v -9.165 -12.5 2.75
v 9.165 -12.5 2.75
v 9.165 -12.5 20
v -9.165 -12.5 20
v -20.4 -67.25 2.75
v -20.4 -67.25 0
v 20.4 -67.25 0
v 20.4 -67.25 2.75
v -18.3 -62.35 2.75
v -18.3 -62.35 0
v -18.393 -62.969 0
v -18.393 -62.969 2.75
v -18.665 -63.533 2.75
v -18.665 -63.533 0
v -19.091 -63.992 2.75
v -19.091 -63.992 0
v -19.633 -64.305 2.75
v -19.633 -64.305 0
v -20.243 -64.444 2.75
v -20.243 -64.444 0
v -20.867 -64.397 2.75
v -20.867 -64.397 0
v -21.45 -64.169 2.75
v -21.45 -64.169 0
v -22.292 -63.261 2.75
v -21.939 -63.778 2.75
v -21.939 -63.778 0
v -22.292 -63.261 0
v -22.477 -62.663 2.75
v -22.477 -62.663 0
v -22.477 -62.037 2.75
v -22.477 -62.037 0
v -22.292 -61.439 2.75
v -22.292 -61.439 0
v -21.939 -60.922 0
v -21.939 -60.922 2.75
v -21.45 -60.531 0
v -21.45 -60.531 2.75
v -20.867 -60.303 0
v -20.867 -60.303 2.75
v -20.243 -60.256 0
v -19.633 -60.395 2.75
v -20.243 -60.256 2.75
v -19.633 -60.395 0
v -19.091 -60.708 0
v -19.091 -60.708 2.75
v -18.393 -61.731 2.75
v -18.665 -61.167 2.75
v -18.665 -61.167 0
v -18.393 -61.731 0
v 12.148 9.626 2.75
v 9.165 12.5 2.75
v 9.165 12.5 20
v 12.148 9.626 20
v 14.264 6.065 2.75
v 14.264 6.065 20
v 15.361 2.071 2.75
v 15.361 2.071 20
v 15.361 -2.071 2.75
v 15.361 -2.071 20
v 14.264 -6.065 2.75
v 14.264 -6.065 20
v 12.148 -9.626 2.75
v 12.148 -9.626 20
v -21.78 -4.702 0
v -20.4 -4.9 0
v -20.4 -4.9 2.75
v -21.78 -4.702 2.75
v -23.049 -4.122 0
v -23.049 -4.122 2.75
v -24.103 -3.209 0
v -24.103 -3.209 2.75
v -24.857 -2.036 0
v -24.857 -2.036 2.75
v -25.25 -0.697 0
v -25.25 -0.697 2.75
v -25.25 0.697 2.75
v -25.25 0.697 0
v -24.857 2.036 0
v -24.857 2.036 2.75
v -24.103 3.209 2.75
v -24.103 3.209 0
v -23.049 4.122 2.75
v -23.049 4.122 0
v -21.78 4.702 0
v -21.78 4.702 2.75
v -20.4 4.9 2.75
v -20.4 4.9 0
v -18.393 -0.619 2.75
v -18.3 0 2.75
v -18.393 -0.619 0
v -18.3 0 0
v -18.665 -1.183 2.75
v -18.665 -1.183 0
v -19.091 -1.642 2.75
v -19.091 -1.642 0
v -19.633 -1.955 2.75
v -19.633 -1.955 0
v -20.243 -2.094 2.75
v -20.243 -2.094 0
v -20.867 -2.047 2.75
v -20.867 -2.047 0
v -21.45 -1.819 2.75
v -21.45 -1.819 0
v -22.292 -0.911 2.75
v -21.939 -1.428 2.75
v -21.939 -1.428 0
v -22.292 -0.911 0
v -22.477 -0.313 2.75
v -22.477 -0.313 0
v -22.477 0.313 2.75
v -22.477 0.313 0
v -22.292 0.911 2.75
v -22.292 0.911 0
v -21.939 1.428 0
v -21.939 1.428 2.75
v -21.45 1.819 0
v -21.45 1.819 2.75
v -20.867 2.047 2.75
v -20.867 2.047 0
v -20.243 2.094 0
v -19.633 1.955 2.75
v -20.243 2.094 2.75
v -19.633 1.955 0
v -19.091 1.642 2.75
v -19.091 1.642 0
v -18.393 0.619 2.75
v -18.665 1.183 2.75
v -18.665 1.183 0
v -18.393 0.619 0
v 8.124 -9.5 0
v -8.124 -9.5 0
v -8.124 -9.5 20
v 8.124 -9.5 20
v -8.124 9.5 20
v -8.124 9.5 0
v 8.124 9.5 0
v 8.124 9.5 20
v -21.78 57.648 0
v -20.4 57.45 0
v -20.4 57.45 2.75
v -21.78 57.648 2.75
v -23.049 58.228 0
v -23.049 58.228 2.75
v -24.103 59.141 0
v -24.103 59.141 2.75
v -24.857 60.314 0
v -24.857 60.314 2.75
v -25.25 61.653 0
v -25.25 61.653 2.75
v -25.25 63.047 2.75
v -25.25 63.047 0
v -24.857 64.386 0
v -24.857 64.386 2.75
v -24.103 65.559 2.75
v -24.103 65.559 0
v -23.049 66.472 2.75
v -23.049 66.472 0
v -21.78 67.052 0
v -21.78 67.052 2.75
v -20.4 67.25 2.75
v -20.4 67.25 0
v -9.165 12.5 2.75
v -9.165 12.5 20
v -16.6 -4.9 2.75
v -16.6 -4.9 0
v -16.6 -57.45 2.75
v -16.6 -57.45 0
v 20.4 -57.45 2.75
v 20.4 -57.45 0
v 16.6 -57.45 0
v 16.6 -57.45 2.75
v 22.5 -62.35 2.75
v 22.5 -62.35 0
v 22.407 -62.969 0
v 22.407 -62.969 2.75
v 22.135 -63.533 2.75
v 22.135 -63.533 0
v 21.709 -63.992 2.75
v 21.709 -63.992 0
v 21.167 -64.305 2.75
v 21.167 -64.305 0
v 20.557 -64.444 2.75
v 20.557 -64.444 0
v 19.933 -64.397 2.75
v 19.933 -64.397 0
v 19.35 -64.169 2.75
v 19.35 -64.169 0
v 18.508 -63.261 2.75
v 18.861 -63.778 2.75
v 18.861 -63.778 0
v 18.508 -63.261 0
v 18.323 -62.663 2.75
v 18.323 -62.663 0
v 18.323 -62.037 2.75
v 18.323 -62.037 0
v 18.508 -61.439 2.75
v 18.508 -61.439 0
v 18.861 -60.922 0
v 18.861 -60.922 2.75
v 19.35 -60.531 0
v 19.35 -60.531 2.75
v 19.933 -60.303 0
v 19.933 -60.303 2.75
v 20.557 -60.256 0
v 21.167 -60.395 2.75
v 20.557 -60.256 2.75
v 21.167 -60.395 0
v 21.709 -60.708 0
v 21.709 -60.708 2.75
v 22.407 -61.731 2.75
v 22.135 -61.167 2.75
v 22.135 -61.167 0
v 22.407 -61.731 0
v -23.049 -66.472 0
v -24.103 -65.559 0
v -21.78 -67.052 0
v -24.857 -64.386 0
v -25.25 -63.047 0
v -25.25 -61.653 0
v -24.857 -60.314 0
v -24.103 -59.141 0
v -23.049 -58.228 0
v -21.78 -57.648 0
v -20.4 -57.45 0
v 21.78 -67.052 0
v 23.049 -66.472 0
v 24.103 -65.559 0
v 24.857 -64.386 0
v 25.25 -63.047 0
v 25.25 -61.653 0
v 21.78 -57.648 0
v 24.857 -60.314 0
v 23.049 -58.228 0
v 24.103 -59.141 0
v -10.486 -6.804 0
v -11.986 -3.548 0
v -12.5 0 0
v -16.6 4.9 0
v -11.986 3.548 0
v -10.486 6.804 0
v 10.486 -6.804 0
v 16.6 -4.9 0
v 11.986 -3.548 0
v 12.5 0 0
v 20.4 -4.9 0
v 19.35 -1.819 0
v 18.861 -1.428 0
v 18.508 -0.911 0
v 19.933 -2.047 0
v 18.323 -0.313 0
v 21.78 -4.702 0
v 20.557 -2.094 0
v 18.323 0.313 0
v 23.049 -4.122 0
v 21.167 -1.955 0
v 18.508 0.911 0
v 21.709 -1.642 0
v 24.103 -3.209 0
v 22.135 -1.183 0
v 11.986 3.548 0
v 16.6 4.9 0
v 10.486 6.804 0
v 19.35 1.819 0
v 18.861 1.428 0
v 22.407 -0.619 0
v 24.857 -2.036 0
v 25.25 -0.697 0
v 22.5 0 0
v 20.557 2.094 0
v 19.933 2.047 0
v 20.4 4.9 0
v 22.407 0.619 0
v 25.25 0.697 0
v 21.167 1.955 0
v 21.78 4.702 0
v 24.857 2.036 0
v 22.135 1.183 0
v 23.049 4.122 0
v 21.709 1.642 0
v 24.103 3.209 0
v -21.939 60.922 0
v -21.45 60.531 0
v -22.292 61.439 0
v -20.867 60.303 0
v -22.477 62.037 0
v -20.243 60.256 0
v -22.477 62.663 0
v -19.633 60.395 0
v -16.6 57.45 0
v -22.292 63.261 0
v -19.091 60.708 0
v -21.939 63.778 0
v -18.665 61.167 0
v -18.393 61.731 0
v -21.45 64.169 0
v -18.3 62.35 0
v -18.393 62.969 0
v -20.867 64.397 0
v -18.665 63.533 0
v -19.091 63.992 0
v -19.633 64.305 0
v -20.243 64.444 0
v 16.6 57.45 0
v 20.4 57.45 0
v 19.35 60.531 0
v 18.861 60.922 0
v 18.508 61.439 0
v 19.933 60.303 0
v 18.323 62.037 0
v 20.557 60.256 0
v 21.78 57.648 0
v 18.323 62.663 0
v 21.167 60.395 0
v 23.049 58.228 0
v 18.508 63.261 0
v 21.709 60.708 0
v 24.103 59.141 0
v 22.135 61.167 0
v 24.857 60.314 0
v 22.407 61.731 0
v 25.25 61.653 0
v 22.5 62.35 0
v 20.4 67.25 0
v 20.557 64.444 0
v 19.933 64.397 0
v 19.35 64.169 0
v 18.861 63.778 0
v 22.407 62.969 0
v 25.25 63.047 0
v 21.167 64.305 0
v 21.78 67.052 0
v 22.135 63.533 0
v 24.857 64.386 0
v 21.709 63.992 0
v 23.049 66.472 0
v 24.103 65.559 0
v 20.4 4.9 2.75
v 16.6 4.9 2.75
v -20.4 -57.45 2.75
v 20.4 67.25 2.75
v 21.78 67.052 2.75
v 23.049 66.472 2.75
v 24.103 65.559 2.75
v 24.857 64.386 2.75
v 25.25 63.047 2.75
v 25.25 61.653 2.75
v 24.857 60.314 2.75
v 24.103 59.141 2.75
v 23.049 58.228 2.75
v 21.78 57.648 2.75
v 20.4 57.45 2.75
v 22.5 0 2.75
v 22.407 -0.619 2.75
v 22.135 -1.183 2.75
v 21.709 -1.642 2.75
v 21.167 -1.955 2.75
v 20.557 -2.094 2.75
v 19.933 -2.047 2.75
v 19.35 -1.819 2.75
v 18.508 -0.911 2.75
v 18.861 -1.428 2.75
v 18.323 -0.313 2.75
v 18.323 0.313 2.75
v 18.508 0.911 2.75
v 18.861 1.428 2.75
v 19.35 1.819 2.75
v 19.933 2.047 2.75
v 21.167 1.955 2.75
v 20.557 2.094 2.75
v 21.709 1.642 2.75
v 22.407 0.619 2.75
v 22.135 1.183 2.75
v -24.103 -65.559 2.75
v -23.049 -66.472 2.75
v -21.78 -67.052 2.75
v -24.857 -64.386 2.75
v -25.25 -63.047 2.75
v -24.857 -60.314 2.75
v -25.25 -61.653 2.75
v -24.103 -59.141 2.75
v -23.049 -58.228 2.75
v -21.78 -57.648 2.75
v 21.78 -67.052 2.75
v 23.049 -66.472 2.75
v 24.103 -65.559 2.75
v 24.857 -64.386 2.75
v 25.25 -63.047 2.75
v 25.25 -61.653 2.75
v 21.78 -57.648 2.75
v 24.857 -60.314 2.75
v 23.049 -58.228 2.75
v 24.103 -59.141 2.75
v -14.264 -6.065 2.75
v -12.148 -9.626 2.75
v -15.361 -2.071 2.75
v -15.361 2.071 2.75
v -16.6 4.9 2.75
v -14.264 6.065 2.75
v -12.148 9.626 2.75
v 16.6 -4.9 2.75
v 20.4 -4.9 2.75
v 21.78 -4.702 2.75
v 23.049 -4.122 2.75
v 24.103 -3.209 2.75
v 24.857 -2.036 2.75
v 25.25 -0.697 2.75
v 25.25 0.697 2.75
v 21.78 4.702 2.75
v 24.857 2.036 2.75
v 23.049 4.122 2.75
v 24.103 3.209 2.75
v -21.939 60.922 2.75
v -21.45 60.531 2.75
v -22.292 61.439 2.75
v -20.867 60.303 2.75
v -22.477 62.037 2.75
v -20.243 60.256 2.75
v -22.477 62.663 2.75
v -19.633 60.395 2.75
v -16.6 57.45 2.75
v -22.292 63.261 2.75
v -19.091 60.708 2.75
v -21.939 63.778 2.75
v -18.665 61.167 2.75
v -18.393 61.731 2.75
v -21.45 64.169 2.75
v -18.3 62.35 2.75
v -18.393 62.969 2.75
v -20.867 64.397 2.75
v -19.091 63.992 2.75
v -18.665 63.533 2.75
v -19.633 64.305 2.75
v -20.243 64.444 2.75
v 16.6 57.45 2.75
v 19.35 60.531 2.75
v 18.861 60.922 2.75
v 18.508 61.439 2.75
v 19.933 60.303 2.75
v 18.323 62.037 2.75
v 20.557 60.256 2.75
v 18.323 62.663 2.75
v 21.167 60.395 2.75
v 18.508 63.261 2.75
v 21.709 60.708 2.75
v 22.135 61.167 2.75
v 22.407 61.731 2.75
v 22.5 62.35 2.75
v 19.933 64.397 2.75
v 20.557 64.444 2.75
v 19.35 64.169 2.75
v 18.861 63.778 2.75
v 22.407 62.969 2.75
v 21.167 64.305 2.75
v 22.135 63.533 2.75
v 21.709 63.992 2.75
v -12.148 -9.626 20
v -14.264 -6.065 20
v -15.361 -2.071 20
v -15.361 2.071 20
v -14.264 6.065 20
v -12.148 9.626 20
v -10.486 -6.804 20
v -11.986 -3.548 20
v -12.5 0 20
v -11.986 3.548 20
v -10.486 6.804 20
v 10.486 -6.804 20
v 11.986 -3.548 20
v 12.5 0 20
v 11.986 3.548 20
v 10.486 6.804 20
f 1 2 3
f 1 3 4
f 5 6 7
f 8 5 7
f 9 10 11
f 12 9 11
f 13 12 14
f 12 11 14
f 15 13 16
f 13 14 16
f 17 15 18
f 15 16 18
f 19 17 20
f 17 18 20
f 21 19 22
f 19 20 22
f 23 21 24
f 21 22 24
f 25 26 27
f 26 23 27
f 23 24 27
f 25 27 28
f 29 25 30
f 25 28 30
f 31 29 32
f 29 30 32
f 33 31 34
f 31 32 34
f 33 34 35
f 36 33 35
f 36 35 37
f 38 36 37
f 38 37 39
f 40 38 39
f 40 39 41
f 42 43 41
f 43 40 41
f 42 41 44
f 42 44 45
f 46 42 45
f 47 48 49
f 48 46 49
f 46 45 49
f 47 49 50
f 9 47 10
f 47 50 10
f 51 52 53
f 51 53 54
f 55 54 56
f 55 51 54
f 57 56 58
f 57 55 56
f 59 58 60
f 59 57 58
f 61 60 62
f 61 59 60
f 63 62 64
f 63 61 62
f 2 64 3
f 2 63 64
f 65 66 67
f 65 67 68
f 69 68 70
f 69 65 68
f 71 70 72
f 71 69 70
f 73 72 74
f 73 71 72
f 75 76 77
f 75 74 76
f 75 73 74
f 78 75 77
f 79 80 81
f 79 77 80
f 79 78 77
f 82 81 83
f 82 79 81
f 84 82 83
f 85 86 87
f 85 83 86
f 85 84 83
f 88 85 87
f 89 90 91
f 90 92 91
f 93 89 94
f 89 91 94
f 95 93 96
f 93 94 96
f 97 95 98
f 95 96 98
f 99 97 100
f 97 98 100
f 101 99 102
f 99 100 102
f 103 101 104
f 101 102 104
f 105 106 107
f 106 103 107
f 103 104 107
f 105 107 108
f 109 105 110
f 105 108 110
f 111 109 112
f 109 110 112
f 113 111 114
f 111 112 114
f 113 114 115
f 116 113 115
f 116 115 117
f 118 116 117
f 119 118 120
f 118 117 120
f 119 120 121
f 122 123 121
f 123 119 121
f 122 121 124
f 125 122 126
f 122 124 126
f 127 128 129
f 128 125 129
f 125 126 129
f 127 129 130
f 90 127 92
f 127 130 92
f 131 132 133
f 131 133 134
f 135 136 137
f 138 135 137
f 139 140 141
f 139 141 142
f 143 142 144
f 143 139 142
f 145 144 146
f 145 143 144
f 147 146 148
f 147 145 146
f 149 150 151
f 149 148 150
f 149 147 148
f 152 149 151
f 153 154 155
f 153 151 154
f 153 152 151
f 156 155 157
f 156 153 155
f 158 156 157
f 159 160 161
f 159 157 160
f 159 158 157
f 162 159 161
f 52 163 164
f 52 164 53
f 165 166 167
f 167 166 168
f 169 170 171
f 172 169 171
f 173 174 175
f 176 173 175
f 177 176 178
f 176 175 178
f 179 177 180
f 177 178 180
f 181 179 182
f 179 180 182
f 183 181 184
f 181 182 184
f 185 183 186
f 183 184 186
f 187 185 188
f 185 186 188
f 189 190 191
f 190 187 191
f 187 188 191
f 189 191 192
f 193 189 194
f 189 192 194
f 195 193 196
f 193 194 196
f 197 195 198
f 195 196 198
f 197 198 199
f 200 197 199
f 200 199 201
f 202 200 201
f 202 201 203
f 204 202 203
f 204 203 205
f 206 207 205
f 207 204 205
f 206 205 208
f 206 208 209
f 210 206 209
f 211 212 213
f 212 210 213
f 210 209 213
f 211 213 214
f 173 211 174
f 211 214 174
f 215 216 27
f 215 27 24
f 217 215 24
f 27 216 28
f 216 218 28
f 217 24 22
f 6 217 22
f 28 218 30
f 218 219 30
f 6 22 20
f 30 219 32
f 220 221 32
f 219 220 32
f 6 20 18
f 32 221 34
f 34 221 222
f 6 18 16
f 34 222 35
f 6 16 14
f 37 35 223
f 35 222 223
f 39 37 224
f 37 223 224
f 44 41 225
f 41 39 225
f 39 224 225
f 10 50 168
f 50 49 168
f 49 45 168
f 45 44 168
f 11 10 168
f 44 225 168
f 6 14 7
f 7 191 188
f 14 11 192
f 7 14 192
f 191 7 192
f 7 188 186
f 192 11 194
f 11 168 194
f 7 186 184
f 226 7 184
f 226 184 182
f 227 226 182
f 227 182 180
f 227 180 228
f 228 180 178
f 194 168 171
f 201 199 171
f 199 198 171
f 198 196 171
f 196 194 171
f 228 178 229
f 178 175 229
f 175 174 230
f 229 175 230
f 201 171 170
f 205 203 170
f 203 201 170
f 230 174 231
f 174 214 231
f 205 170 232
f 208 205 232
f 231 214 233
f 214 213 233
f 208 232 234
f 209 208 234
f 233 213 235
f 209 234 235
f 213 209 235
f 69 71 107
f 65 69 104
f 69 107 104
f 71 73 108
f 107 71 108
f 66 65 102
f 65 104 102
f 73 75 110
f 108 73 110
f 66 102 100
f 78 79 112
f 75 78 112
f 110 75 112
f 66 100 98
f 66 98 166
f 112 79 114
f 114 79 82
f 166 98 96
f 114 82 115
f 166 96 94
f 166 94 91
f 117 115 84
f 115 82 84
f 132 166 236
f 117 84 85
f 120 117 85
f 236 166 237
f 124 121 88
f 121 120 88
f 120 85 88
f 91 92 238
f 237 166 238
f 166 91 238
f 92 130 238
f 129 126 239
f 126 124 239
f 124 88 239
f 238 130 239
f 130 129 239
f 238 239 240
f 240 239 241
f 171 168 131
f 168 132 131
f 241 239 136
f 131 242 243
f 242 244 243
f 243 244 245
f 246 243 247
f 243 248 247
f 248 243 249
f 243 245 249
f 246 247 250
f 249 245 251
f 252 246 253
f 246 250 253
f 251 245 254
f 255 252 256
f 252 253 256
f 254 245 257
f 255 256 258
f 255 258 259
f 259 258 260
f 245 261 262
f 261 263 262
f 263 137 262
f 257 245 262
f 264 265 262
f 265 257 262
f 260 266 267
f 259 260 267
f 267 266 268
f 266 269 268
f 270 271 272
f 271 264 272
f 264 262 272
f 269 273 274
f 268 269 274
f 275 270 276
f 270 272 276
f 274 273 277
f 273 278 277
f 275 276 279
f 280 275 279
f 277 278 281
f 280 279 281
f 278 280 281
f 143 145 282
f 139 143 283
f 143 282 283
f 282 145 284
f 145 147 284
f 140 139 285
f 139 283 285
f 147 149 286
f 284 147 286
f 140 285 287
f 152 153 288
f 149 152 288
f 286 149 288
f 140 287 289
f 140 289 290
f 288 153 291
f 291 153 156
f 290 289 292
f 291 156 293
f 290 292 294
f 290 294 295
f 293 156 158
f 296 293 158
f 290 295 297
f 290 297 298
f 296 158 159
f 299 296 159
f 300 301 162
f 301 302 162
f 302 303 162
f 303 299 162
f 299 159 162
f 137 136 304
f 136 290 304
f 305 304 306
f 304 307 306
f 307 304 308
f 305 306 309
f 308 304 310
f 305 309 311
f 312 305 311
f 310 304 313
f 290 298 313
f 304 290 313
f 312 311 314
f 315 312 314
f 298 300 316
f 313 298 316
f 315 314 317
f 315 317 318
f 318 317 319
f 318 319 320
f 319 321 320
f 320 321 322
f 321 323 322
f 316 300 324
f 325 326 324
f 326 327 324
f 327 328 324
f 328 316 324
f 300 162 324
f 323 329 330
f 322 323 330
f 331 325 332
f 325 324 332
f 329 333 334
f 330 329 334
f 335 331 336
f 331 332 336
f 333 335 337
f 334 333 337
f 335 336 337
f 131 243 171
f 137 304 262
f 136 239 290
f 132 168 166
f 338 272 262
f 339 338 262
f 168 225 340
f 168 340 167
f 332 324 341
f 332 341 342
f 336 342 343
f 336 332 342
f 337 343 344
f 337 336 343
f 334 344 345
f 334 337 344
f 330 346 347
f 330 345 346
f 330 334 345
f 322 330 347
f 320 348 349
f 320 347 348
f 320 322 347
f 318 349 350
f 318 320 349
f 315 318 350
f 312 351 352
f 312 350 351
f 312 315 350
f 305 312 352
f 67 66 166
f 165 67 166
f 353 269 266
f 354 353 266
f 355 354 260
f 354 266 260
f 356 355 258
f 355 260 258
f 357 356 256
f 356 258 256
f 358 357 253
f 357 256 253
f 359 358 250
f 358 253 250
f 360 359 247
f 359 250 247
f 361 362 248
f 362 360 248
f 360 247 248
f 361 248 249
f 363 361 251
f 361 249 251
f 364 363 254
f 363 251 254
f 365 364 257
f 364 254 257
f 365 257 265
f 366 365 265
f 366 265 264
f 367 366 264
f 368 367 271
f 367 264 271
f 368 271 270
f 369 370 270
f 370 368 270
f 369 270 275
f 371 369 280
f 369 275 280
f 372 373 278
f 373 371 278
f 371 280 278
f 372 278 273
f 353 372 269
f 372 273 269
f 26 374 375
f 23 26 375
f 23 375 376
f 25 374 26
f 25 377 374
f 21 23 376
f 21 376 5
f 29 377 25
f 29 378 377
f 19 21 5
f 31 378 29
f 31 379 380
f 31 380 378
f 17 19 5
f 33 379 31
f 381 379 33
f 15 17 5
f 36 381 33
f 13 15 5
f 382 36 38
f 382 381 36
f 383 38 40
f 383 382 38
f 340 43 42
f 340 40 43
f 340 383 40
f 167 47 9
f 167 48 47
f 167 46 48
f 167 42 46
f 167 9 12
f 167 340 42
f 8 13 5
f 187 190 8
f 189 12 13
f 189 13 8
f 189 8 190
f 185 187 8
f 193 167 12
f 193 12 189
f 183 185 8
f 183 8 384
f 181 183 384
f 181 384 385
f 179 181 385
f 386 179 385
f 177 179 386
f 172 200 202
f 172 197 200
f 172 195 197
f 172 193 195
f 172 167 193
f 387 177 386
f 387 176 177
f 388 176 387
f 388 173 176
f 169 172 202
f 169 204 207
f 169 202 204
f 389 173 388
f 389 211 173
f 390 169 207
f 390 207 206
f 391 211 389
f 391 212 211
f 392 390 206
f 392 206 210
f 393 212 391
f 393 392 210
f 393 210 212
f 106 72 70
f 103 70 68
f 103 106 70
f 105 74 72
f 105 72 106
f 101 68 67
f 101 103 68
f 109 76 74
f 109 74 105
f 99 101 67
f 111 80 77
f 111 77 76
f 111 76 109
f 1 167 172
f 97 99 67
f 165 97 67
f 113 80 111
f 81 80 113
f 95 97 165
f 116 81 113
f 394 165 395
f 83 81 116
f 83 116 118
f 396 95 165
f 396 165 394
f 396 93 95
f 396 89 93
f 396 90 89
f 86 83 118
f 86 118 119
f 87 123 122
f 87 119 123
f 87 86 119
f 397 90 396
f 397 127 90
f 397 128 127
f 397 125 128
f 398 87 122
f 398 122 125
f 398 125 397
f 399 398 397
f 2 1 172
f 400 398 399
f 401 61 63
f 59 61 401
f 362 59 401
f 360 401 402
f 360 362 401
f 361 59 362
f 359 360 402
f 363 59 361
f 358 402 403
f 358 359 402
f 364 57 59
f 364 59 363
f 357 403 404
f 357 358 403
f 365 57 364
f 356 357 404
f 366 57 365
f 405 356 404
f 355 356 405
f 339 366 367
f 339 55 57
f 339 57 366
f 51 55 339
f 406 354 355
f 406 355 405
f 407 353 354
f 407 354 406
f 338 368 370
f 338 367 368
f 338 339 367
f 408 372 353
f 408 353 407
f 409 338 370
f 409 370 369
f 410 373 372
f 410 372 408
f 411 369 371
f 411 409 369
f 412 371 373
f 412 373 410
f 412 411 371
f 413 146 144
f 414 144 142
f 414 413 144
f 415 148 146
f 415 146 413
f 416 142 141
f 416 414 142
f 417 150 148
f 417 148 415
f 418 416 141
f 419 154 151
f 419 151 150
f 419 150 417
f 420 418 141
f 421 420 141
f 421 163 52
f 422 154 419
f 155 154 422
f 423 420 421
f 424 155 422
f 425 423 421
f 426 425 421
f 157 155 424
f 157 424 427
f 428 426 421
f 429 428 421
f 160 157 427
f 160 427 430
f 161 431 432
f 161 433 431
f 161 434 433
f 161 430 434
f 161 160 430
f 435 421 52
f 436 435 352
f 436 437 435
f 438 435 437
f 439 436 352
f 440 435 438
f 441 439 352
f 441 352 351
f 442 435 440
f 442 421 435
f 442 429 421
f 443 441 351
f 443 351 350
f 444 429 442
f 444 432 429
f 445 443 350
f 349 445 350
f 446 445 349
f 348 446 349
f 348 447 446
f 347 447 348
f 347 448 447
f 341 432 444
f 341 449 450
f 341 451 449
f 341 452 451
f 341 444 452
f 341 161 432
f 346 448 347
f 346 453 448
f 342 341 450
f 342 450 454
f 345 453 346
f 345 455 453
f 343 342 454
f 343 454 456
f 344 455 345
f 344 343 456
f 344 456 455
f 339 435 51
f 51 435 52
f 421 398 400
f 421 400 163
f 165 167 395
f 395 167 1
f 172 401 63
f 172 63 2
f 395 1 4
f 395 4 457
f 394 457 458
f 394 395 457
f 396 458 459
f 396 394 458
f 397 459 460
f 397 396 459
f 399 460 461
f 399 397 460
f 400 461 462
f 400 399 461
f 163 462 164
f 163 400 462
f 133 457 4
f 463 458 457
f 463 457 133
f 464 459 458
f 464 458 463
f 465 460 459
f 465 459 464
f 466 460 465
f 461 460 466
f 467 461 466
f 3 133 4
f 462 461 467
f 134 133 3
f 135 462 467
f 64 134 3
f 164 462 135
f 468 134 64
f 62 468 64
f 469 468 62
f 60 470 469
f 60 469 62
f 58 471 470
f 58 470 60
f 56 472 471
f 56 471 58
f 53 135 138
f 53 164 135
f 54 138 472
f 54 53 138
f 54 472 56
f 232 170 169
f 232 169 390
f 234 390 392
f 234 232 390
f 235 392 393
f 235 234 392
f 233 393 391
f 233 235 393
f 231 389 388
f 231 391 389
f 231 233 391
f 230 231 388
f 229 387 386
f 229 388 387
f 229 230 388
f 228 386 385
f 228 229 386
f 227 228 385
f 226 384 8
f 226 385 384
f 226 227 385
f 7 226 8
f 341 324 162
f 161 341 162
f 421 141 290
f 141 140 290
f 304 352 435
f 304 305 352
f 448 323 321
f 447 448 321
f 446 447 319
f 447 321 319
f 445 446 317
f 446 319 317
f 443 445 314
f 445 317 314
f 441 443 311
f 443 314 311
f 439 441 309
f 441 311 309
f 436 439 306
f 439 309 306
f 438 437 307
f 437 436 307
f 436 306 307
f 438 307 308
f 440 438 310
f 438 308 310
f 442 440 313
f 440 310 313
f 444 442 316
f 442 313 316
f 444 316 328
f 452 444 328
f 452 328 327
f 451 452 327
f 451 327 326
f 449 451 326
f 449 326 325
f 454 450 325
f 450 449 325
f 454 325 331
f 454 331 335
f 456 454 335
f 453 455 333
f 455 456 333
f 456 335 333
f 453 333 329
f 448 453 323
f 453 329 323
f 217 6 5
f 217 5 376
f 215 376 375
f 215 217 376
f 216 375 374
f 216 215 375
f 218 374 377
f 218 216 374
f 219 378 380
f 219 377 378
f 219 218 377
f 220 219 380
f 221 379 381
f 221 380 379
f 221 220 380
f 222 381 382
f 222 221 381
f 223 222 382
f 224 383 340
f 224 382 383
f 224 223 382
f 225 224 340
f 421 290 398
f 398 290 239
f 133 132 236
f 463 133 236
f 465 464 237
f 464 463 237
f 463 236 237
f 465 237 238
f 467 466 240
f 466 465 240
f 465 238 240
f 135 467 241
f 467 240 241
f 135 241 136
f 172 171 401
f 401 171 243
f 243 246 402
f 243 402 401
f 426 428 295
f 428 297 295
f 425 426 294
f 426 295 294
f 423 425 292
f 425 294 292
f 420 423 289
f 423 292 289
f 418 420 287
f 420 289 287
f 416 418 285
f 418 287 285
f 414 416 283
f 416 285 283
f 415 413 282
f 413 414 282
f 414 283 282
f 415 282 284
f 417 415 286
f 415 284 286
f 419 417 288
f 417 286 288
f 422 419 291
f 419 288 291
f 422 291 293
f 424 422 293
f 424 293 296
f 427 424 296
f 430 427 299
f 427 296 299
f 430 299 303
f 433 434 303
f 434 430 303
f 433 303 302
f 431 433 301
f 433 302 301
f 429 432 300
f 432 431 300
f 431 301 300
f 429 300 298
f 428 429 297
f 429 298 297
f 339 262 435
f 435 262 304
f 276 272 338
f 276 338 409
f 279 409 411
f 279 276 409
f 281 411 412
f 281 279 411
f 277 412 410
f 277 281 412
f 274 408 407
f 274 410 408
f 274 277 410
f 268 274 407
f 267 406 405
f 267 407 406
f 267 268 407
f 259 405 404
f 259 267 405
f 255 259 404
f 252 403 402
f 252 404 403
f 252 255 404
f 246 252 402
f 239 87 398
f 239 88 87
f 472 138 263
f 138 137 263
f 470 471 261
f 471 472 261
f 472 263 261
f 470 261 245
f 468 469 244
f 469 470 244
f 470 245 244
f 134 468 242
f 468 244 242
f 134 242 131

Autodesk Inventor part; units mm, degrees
ref_plane "YZ Plane" through (0, 0, 0) normal (1, 0, 0) x (0, 1, 0)
ref_plane "XZ Plane" through (0, 0, 0) normal (0, 1, 0) x (-1, 0, 0)
sketch "Sketch1" plane through (0, 0, 0) normal (0, 0, 1) x (1, 0, 0)
  line L0 (-8.124, 9.5) -> (8.124, 9.5)
  line L1 (-8.124, -9.5) -> (8.124, -9.5)
  line L2 (-14.5312, 0) -> (9.3904, 0) construction
  arc A0 (-8.124, 9.5) -> (-8.124, -9.5) centre (0, 0) ccw
  arc A1 (8.124, -9.5) -> (8.124, 9.5) centre (0, 0) ccw
  line L3 (-29.5712, -67.25) -> (29.5712, -67.25)
  line L4 (29.5712, 67.25) -> (-29.5712, 67.25)
  arc A2 (-20.4, -57.45) -> (-20.4, -67.25) centre (-20.4, -62.35) ccw
  line L5 (-20.4, -67.25) -> (-29.5712, -67.25)
  line L6 (-20.4, -57.45) -> (-16.6, -57.45)
  circle A3 centre (-20.4, -62.35) radius 2.1
  line L7 (0, -40.5988) -> (0, 24.1265) construction
  arc A4 (-20.4, 67.25) -> (-20.4, 57.45) centre (-20.4, 62.35) ccw
  line L8 (-20.4, 67.25) -> (-29.5712, 67.25)
  line L9 (-20.4, 57.45) -> (-16.6, 57.45)
  circle A5 centre (-20.4, 62.35) radius 2.1
  arc A6 (20.4, -67.25) -> (20.4, -57.45) centre (20.4, -62.35) ccw
  line L10 (20.4, -67.25) -> (29.5712, -67.25)
  line L11 (20.4, -57.45) -> (16.6, -57.45)
  circle A7 centre (20.4, -62.35) radius 2.1
  line L12 (20.4, 57.45) -> (16.6, 57.45)
  circle A8 centre (20.4, 62.35) radius 2.1
  line L13 (20.4, 67.25) -> (29.5712, 67.25)
  arc A9 (20.4, 57.45) -> (20.4, 67.25) centre (20.4, 62.35) ccw
  arc A10 (-20.4, 4.9) -> (-20.4, -4.9) centre (-20.4, 0) ccw
  line L14 (-20.4, -4.9) -> (-16.6, -4.9)
  line L15 (-20.4, 4.9) -> (-16.6, 4.9)
  circle A11 centre (-20.4, 0) radius 2.1
  line L16 (-16.6, 57.45) -> (-16.6, 4.9)
  line L17 (-16.6, -4.9) -> (-16.6, -57.45)
  line L18 (20.4, 4.9) -> (16.6, 4.9)
  arc A12 (20.4, -4.9) -> (20.4, 4.9) centre (20.4, 0) ccw
  circle A13 centre (20.4, 0) radius 2.1
  line L19 (20.4, -4.9) -> (16.6, -4.9)
  line L20 (16.6, -57.45) -> (16.6, -4.9)
  line L21 (16.6, 4.9) -> (16.6, 57.45)
  line L22 (9.1652, -12.5) -> (-9.1652, -12.5)
  arc A14 (-9.1652, 12.5) -> (-9.1652, -12.5) centre (0, 0) ccw
  line L23 (-9.1652, 12.5) -> (9.1652, 12.5)
  arc A15 (9.1652, -12.5) -> (9.1652, 12.5) centre (0, 0) ccw
  point P0 (-42.7024, 0)
  dimension "d1" = 19
  dimension "d2" = 4.2
  dimension "d3" = 4.9
  dimension "d4" = 134.5
  dimension "d5" = 4.2
  dimension "d6" = 4.9
  dimension "d9" = 3
  dimension "d34" = 33.2
  dimension "d35" = 3.8
  dimension "d36" = 3.8
  dimension "d37" = 12.5
  dimension "d38" = 12.5
extrude "Extrusion1" add sketch "Sketch1" along normal blind 2.75 contours A2 L6 L17 L14 A10 L15 L16 L9 A4 L4 A9 L12 L21 L18 A12 L19 L20 L11 A6 L3 | L22 A14 L23 A15
extrude "Extrusion2" add sketch "Sketch1" along normal blind 20 contours L22 A14 L23 A15
ref_plane "Work Plane1" through (0, 0, 52.75) normal (0, 0, 1) x (1, 0, 0)
properties part number "Gripper_MotorHolder"
